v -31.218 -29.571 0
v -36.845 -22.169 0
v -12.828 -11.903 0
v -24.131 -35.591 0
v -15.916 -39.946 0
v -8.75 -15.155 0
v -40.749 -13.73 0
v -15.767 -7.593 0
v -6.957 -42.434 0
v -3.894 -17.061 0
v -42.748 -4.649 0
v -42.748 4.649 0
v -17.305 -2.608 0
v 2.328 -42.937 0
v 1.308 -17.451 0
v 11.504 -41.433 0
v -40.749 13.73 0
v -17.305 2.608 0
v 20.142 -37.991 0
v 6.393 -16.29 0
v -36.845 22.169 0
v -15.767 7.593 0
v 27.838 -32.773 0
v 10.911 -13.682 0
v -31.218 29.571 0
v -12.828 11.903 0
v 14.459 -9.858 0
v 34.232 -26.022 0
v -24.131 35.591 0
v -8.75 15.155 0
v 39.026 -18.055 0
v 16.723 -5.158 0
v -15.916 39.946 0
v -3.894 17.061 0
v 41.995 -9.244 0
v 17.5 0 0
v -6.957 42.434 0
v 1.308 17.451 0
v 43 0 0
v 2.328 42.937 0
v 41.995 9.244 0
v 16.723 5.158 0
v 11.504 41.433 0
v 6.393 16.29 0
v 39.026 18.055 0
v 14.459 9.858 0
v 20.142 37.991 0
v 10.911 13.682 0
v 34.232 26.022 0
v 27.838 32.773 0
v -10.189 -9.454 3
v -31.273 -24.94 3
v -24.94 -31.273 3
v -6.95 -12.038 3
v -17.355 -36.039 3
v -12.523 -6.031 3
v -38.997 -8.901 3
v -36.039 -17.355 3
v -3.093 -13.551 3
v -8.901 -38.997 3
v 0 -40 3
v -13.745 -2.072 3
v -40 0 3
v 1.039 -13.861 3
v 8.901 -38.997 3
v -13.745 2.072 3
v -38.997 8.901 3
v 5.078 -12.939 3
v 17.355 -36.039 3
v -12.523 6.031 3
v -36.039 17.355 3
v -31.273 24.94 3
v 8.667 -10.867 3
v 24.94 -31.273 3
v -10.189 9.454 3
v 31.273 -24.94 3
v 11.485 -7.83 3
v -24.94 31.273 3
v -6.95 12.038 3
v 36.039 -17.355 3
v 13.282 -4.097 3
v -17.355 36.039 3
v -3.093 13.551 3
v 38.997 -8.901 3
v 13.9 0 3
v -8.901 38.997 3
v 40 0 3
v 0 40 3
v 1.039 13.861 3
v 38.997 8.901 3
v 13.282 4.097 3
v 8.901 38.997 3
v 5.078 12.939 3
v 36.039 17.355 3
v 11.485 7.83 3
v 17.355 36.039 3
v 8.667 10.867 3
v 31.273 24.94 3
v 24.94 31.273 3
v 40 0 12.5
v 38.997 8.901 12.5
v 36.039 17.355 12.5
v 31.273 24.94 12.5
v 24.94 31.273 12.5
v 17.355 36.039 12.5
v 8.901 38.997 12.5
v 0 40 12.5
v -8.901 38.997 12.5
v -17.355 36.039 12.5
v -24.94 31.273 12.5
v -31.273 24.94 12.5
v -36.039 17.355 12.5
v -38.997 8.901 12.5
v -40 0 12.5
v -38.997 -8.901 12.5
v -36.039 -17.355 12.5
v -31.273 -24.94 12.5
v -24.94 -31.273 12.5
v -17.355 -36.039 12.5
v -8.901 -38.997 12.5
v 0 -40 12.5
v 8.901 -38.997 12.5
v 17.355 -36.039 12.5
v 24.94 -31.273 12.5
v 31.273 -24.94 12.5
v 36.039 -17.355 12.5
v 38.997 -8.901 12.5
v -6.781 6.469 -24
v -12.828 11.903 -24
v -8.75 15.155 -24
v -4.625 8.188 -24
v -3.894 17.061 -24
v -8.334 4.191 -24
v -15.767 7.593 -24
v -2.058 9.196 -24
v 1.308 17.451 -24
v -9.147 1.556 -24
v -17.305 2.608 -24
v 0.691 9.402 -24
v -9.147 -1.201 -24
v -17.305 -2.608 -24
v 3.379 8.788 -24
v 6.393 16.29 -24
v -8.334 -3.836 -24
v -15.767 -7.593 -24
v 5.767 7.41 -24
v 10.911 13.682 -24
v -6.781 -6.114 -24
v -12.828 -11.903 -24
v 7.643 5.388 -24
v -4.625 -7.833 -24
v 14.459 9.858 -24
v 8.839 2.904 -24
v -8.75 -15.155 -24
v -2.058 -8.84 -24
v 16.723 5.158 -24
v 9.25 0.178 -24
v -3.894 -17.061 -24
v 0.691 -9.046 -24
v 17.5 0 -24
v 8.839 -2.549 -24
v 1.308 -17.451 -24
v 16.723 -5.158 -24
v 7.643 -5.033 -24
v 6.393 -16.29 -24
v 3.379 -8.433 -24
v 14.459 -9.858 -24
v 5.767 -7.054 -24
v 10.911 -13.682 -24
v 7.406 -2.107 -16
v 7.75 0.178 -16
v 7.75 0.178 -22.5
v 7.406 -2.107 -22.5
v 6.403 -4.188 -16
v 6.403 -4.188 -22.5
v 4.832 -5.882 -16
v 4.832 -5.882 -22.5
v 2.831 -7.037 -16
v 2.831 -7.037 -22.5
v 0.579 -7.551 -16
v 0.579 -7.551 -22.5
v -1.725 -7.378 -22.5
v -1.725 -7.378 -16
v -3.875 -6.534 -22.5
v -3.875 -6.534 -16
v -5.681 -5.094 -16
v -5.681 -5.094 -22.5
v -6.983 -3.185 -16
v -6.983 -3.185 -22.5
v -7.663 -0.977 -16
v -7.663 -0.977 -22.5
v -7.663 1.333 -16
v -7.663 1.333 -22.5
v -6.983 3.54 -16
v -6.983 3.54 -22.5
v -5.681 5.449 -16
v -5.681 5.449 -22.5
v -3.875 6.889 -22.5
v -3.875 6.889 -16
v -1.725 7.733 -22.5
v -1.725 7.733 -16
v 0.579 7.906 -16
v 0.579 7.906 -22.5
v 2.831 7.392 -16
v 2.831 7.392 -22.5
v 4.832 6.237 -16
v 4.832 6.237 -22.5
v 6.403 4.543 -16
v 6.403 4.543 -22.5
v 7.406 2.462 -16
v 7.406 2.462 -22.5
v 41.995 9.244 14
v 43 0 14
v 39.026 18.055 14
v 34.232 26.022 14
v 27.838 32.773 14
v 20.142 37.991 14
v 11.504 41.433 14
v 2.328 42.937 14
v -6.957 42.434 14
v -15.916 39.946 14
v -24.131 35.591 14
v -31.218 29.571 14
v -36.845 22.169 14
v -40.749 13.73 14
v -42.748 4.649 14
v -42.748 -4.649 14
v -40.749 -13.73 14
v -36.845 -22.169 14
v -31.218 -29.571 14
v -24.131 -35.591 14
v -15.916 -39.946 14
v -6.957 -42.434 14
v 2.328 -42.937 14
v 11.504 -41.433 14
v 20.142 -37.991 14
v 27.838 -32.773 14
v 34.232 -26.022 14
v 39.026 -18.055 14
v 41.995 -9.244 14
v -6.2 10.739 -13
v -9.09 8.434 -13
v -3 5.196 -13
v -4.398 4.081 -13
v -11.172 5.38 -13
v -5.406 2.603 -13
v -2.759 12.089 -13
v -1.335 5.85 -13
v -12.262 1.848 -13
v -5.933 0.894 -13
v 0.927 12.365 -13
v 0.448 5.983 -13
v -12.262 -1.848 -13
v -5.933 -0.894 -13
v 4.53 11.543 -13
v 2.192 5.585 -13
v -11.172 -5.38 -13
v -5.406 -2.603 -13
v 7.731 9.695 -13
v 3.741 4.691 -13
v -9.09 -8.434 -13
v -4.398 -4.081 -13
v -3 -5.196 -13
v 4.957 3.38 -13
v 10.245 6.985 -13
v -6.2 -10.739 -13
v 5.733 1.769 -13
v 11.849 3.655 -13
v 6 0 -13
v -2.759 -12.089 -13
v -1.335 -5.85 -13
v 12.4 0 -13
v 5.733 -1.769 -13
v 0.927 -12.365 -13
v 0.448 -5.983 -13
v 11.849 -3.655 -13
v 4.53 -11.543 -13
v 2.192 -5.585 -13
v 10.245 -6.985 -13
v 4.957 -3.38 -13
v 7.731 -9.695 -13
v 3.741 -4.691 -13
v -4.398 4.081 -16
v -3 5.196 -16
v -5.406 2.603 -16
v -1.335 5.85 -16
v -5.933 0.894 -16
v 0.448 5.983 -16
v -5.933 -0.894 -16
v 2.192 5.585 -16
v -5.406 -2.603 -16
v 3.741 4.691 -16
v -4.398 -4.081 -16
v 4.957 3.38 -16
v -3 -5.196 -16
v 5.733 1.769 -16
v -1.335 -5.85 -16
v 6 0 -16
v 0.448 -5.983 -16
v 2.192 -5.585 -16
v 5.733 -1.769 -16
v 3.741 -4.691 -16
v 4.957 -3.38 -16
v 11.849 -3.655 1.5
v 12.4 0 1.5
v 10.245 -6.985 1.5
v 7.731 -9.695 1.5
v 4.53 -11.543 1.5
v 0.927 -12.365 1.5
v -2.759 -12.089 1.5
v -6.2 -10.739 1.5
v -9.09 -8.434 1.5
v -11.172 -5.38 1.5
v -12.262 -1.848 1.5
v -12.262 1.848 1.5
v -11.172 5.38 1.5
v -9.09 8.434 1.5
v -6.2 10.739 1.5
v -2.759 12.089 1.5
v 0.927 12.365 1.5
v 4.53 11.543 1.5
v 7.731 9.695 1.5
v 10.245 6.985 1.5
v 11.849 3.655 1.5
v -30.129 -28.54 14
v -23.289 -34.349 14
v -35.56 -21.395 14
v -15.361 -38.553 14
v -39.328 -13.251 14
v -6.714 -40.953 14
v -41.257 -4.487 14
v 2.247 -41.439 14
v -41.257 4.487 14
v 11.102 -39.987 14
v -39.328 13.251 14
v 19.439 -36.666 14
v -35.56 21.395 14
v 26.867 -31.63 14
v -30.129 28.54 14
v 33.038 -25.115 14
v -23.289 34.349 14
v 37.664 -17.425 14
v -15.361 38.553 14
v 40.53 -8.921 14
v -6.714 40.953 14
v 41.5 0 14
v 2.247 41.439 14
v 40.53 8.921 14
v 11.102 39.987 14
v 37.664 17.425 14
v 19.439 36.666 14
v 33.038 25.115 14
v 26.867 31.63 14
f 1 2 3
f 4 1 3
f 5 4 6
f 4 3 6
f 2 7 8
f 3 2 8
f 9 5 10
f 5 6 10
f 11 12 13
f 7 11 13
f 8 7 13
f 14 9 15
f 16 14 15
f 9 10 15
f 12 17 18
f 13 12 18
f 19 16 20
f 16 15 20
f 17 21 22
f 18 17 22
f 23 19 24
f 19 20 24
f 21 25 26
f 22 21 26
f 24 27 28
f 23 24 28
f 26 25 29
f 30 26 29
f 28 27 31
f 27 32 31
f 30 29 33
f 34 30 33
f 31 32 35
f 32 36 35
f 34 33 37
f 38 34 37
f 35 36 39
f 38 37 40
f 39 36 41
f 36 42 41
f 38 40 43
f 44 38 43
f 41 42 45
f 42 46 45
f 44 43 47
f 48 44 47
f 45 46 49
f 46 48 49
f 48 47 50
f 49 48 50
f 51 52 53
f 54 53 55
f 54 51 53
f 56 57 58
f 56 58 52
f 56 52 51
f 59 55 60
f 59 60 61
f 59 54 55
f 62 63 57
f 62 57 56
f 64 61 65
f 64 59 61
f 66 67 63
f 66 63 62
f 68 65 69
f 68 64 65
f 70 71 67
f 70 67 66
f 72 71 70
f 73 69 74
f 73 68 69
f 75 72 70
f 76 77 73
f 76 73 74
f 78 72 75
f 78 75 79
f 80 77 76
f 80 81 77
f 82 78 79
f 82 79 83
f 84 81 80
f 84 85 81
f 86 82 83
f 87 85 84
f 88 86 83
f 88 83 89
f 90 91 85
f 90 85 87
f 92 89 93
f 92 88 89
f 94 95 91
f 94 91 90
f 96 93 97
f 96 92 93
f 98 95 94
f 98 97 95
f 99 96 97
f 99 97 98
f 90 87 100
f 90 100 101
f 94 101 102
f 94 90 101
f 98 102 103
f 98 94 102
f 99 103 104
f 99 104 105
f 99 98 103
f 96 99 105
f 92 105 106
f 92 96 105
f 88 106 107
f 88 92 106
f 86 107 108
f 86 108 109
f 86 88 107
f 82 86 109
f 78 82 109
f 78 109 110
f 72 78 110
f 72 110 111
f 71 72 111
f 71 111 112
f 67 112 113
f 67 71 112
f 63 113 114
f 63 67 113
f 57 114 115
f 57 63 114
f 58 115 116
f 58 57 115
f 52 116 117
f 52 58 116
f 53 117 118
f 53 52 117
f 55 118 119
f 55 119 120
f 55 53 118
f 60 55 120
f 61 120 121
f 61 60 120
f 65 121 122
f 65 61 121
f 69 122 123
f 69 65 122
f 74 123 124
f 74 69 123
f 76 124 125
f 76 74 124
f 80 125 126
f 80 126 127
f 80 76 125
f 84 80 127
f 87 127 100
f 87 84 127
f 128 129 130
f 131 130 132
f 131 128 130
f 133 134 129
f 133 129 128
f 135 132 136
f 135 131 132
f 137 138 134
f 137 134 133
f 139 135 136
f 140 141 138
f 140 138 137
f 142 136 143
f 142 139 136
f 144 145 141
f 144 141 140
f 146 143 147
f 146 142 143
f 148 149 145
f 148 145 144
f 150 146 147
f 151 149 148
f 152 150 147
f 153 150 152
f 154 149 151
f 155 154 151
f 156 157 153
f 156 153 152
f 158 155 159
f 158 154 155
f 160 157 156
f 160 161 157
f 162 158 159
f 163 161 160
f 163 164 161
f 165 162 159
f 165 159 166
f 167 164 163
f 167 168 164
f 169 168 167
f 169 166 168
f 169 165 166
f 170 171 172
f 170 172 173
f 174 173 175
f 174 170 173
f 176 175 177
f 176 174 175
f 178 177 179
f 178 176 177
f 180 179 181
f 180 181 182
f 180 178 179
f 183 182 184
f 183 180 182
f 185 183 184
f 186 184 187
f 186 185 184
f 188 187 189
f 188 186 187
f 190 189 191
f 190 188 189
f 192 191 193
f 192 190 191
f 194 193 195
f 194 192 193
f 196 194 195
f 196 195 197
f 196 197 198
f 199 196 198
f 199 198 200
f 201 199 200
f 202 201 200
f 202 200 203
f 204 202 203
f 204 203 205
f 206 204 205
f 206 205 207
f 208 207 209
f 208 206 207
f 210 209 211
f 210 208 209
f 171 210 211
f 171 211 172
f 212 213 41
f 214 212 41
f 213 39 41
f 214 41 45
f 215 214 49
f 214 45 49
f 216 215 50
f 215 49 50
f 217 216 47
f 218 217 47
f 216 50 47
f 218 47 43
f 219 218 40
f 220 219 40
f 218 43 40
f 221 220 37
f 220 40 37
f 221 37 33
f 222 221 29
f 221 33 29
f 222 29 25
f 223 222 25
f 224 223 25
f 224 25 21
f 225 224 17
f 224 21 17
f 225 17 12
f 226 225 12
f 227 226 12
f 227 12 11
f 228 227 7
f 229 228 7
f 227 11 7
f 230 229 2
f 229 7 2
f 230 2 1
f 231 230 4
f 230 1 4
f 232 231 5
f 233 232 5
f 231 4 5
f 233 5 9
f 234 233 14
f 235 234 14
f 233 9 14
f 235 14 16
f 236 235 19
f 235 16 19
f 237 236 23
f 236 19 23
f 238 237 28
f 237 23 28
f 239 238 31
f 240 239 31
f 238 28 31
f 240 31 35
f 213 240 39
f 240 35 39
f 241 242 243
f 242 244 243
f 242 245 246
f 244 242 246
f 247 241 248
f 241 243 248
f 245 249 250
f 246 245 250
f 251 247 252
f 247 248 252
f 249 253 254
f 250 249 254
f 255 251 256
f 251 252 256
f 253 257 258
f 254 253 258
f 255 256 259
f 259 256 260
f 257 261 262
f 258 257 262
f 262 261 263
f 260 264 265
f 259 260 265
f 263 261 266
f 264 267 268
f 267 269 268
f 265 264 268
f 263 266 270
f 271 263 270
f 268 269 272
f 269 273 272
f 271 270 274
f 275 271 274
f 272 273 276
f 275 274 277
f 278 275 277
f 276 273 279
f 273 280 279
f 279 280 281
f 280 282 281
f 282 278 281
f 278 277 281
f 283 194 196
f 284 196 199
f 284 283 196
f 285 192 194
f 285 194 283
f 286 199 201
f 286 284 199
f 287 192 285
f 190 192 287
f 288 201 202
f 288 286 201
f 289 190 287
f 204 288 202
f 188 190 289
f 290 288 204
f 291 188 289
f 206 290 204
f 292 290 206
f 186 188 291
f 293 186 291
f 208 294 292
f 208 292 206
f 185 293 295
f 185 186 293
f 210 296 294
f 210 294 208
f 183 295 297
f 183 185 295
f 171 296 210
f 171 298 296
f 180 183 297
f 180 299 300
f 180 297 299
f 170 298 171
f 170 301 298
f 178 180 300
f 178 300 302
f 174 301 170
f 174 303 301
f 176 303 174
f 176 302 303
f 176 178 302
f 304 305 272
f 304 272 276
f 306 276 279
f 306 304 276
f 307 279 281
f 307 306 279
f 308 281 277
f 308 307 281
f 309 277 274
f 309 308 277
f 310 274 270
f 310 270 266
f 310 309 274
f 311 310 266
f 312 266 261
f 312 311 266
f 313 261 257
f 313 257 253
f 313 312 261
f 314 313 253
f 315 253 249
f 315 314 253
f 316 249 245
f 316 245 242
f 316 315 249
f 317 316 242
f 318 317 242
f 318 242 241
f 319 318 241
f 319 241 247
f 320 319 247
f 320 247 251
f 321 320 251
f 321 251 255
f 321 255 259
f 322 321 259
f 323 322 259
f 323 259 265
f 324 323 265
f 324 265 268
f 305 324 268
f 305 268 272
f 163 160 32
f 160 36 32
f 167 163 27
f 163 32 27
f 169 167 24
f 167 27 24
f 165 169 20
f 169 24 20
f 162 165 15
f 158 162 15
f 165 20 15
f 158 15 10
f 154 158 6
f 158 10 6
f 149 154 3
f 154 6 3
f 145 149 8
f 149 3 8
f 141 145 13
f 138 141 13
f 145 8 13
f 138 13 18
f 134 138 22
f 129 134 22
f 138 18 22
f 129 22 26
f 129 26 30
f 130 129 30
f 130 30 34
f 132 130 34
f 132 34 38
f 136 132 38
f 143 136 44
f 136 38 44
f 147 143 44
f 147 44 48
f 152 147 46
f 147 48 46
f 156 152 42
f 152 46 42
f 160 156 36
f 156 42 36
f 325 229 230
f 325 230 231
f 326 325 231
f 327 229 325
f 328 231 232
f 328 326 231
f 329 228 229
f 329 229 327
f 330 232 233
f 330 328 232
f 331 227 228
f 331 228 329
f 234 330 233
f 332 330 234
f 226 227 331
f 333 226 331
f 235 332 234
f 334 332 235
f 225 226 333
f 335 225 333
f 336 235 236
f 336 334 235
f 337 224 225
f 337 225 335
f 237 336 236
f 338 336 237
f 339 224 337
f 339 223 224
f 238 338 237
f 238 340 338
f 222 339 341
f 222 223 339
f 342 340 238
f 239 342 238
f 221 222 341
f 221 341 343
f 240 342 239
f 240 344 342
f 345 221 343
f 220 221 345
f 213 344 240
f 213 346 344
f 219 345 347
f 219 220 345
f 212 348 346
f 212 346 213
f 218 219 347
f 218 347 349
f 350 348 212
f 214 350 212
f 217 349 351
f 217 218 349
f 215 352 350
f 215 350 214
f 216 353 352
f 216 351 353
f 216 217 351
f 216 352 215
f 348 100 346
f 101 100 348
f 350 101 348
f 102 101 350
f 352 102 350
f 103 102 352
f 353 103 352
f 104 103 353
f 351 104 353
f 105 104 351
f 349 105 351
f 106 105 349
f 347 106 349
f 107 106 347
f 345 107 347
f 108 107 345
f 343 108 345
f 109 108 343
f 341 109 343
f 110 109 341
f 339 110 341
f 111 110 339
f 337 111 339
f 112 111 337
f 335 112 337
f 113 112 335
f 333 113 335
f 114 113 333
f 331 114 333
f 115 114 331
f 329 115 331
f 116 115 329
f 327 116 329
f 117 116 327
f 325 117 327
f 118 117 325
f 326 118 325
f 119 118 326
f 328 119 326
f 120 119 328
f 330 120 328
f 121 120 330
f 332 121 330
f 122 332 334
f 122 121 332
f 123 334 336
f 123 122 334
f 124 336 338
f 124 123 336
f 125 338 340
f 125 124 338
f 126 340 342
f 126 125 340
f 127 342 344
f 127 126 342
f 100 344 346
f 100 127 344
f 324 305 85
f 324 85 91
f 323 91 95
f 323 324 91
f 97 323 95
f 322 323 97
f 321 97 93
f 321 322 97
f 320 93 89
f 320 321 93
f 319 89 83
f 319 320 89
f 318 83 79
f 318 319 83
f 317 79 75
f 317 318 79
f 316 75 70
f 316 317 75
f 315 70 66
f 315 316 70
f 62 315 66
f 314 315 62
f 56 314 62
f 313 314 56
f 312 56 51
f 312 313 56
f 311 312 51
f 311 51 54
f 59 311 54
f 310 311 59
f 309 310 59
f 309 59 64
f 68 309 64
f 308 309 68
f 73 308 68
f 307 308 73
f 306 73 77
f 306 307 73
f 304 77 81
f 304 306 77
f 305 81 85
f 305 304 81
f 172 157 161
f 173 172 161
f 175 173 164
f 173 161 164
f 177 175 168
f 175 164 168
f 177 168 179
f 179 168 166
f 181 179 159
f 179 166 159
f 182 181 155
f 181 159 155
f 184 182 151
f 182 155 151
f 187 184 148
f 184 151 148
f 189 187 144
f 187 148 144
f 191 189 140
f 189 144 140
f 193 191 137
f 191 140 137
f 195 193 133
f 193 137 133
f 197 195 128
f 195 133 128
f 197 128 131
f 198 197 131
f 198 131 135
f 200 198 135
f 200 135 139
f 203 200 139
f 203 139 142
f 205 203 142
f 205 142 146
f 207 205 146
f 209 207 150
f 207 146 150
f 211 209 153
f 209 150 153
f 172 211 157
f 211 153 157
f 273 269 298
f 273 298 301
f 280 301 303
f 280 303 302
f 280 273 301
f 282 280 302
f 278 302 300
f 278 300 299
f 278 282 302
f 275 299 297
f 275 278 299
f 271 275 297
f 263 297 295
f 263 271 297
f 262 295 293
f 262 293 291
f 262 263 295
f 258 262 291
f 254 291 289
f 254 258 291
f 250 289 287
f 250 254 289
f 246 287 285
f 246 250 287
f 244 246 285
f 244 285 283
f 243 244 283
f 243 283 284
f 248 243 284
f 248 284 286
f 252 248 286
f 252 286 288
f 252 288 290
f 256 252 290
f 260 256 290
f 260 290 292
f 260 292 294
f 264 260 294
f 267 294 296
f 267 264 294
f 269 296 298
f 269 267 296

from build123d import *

# Parameters (mm, degrees)
SKETCH_R        = 43
PAD_DEPTH       = 3
SKETCH001_R     = 43
SKETCH001_R_2   = 40
PAD001_DEPTH    = 11
SKETCH002_R     = 12.4
POCKET_DEPTH    = 5
SKETCH003_R     = 17.5
SKETCH003_R_2   = 12.4
PAD002_DEPTH    = 13
SKETCH004_R     = 17.5
SKETCH004_R_2   = 6
PAD003_DEPTH    = 3
SKETCH005_R     = 17.5
SKETCH005_R_2   = 7.75
PAD004_DEPTH    = 8
CHAMFER_SIZE    = 1.5
CHAMFER001_SIZE = 1.5
CHAMFER002_SIZE = 1.5


with BuildPart() as part:
    # Sketch → Pad (new body)
    with BuildSketch(Plane.XY):
        Circle(SKETCH_R)
    extrude(amount=PAD_DEPTH)

    # Sketch001 (on Face3 of Pad) → Pad001 (join)
    with BuildSketch(Plane.XY.offset(3)):
        Circle(SKETCH001_R)
        Circle(SKETCH001_R_2, mode=Mode.SUBTRACT)
    extrude(amount=PAD001_DEPTH)

    # Sketch002 (on Face6 of Pad001) → Pocket (cut)
    with BuildSketch(Plane.XY.offset(3)):
        Circle(SKETCH002_R)
    extrude(amount=-POCKET_DEPTH, mode=Mode.SUBTRACT)

    # Sketch003 (on Face2 of Pocket) → Pad002 (join)
    with BuildSketch(Plane(origin=(0, 0, 0), x_dir=(1, 0, 0), z_dir=(0, 0, -1))):
        Circle(SKETCH003_R)
        Circle(SKETCH003_R_2, mode=Mode.SUBTRACT)
    extrude(amount=PAD002_DEPTH)

    # Sketch004 (on Face6 of Pad002) → Pad003 (join)
    with BuildSketch(Plane(origin=(0, 0, -13), x_dir=(1, 0, 0), z_dir=(0, 0, -1))):
        Circle(SKETCH004_R)
        Circle(SKETCH004_R_2, mode=Mode.SUBTRACT)
    extrude(amount=PAD003_DEPTH)

    # Sketch005 (on Face8 of Pad003) → Pad004 (join)
    with BuildSketch(Plane(origin=(0, 0, -16), x_dir=(1, 0, 0), z_dir=(0, 0, -1))):
        Circle(SKETCH005_R)
        with Locations((0, -0.177664)):
            Circle(SKETCH005_R_2, mode=Mode.SUBTRACT)
    extrude(amount=PAD004_DEPTH)

    # Chamfer
    chamfer_edges = [part.edges().sort_by_distance(p)[0] for p in [
        (-7.75, 0.177664, -24),
    ]]
    chamfer(chamfer_edges, length=CHAMFER_SIZE)

    # Chamfer001
    chamfer001_edges = [part.edges().sort_by_distance(p)[0] for p in [
        (-40, 0, 14),
    ]]
    chamfer(chamfer001_edges, length=CHAMFER001_SIZE)

    # Chamfer002
    chamfer002_edges = [part.edges().sort_by_distance(p)[0] for p in [
        (-12.4, 0, 3),
    ]]
    chamfer(chamfer002_edges, length=CHAMFER002_SIZE)


solid = part.part
